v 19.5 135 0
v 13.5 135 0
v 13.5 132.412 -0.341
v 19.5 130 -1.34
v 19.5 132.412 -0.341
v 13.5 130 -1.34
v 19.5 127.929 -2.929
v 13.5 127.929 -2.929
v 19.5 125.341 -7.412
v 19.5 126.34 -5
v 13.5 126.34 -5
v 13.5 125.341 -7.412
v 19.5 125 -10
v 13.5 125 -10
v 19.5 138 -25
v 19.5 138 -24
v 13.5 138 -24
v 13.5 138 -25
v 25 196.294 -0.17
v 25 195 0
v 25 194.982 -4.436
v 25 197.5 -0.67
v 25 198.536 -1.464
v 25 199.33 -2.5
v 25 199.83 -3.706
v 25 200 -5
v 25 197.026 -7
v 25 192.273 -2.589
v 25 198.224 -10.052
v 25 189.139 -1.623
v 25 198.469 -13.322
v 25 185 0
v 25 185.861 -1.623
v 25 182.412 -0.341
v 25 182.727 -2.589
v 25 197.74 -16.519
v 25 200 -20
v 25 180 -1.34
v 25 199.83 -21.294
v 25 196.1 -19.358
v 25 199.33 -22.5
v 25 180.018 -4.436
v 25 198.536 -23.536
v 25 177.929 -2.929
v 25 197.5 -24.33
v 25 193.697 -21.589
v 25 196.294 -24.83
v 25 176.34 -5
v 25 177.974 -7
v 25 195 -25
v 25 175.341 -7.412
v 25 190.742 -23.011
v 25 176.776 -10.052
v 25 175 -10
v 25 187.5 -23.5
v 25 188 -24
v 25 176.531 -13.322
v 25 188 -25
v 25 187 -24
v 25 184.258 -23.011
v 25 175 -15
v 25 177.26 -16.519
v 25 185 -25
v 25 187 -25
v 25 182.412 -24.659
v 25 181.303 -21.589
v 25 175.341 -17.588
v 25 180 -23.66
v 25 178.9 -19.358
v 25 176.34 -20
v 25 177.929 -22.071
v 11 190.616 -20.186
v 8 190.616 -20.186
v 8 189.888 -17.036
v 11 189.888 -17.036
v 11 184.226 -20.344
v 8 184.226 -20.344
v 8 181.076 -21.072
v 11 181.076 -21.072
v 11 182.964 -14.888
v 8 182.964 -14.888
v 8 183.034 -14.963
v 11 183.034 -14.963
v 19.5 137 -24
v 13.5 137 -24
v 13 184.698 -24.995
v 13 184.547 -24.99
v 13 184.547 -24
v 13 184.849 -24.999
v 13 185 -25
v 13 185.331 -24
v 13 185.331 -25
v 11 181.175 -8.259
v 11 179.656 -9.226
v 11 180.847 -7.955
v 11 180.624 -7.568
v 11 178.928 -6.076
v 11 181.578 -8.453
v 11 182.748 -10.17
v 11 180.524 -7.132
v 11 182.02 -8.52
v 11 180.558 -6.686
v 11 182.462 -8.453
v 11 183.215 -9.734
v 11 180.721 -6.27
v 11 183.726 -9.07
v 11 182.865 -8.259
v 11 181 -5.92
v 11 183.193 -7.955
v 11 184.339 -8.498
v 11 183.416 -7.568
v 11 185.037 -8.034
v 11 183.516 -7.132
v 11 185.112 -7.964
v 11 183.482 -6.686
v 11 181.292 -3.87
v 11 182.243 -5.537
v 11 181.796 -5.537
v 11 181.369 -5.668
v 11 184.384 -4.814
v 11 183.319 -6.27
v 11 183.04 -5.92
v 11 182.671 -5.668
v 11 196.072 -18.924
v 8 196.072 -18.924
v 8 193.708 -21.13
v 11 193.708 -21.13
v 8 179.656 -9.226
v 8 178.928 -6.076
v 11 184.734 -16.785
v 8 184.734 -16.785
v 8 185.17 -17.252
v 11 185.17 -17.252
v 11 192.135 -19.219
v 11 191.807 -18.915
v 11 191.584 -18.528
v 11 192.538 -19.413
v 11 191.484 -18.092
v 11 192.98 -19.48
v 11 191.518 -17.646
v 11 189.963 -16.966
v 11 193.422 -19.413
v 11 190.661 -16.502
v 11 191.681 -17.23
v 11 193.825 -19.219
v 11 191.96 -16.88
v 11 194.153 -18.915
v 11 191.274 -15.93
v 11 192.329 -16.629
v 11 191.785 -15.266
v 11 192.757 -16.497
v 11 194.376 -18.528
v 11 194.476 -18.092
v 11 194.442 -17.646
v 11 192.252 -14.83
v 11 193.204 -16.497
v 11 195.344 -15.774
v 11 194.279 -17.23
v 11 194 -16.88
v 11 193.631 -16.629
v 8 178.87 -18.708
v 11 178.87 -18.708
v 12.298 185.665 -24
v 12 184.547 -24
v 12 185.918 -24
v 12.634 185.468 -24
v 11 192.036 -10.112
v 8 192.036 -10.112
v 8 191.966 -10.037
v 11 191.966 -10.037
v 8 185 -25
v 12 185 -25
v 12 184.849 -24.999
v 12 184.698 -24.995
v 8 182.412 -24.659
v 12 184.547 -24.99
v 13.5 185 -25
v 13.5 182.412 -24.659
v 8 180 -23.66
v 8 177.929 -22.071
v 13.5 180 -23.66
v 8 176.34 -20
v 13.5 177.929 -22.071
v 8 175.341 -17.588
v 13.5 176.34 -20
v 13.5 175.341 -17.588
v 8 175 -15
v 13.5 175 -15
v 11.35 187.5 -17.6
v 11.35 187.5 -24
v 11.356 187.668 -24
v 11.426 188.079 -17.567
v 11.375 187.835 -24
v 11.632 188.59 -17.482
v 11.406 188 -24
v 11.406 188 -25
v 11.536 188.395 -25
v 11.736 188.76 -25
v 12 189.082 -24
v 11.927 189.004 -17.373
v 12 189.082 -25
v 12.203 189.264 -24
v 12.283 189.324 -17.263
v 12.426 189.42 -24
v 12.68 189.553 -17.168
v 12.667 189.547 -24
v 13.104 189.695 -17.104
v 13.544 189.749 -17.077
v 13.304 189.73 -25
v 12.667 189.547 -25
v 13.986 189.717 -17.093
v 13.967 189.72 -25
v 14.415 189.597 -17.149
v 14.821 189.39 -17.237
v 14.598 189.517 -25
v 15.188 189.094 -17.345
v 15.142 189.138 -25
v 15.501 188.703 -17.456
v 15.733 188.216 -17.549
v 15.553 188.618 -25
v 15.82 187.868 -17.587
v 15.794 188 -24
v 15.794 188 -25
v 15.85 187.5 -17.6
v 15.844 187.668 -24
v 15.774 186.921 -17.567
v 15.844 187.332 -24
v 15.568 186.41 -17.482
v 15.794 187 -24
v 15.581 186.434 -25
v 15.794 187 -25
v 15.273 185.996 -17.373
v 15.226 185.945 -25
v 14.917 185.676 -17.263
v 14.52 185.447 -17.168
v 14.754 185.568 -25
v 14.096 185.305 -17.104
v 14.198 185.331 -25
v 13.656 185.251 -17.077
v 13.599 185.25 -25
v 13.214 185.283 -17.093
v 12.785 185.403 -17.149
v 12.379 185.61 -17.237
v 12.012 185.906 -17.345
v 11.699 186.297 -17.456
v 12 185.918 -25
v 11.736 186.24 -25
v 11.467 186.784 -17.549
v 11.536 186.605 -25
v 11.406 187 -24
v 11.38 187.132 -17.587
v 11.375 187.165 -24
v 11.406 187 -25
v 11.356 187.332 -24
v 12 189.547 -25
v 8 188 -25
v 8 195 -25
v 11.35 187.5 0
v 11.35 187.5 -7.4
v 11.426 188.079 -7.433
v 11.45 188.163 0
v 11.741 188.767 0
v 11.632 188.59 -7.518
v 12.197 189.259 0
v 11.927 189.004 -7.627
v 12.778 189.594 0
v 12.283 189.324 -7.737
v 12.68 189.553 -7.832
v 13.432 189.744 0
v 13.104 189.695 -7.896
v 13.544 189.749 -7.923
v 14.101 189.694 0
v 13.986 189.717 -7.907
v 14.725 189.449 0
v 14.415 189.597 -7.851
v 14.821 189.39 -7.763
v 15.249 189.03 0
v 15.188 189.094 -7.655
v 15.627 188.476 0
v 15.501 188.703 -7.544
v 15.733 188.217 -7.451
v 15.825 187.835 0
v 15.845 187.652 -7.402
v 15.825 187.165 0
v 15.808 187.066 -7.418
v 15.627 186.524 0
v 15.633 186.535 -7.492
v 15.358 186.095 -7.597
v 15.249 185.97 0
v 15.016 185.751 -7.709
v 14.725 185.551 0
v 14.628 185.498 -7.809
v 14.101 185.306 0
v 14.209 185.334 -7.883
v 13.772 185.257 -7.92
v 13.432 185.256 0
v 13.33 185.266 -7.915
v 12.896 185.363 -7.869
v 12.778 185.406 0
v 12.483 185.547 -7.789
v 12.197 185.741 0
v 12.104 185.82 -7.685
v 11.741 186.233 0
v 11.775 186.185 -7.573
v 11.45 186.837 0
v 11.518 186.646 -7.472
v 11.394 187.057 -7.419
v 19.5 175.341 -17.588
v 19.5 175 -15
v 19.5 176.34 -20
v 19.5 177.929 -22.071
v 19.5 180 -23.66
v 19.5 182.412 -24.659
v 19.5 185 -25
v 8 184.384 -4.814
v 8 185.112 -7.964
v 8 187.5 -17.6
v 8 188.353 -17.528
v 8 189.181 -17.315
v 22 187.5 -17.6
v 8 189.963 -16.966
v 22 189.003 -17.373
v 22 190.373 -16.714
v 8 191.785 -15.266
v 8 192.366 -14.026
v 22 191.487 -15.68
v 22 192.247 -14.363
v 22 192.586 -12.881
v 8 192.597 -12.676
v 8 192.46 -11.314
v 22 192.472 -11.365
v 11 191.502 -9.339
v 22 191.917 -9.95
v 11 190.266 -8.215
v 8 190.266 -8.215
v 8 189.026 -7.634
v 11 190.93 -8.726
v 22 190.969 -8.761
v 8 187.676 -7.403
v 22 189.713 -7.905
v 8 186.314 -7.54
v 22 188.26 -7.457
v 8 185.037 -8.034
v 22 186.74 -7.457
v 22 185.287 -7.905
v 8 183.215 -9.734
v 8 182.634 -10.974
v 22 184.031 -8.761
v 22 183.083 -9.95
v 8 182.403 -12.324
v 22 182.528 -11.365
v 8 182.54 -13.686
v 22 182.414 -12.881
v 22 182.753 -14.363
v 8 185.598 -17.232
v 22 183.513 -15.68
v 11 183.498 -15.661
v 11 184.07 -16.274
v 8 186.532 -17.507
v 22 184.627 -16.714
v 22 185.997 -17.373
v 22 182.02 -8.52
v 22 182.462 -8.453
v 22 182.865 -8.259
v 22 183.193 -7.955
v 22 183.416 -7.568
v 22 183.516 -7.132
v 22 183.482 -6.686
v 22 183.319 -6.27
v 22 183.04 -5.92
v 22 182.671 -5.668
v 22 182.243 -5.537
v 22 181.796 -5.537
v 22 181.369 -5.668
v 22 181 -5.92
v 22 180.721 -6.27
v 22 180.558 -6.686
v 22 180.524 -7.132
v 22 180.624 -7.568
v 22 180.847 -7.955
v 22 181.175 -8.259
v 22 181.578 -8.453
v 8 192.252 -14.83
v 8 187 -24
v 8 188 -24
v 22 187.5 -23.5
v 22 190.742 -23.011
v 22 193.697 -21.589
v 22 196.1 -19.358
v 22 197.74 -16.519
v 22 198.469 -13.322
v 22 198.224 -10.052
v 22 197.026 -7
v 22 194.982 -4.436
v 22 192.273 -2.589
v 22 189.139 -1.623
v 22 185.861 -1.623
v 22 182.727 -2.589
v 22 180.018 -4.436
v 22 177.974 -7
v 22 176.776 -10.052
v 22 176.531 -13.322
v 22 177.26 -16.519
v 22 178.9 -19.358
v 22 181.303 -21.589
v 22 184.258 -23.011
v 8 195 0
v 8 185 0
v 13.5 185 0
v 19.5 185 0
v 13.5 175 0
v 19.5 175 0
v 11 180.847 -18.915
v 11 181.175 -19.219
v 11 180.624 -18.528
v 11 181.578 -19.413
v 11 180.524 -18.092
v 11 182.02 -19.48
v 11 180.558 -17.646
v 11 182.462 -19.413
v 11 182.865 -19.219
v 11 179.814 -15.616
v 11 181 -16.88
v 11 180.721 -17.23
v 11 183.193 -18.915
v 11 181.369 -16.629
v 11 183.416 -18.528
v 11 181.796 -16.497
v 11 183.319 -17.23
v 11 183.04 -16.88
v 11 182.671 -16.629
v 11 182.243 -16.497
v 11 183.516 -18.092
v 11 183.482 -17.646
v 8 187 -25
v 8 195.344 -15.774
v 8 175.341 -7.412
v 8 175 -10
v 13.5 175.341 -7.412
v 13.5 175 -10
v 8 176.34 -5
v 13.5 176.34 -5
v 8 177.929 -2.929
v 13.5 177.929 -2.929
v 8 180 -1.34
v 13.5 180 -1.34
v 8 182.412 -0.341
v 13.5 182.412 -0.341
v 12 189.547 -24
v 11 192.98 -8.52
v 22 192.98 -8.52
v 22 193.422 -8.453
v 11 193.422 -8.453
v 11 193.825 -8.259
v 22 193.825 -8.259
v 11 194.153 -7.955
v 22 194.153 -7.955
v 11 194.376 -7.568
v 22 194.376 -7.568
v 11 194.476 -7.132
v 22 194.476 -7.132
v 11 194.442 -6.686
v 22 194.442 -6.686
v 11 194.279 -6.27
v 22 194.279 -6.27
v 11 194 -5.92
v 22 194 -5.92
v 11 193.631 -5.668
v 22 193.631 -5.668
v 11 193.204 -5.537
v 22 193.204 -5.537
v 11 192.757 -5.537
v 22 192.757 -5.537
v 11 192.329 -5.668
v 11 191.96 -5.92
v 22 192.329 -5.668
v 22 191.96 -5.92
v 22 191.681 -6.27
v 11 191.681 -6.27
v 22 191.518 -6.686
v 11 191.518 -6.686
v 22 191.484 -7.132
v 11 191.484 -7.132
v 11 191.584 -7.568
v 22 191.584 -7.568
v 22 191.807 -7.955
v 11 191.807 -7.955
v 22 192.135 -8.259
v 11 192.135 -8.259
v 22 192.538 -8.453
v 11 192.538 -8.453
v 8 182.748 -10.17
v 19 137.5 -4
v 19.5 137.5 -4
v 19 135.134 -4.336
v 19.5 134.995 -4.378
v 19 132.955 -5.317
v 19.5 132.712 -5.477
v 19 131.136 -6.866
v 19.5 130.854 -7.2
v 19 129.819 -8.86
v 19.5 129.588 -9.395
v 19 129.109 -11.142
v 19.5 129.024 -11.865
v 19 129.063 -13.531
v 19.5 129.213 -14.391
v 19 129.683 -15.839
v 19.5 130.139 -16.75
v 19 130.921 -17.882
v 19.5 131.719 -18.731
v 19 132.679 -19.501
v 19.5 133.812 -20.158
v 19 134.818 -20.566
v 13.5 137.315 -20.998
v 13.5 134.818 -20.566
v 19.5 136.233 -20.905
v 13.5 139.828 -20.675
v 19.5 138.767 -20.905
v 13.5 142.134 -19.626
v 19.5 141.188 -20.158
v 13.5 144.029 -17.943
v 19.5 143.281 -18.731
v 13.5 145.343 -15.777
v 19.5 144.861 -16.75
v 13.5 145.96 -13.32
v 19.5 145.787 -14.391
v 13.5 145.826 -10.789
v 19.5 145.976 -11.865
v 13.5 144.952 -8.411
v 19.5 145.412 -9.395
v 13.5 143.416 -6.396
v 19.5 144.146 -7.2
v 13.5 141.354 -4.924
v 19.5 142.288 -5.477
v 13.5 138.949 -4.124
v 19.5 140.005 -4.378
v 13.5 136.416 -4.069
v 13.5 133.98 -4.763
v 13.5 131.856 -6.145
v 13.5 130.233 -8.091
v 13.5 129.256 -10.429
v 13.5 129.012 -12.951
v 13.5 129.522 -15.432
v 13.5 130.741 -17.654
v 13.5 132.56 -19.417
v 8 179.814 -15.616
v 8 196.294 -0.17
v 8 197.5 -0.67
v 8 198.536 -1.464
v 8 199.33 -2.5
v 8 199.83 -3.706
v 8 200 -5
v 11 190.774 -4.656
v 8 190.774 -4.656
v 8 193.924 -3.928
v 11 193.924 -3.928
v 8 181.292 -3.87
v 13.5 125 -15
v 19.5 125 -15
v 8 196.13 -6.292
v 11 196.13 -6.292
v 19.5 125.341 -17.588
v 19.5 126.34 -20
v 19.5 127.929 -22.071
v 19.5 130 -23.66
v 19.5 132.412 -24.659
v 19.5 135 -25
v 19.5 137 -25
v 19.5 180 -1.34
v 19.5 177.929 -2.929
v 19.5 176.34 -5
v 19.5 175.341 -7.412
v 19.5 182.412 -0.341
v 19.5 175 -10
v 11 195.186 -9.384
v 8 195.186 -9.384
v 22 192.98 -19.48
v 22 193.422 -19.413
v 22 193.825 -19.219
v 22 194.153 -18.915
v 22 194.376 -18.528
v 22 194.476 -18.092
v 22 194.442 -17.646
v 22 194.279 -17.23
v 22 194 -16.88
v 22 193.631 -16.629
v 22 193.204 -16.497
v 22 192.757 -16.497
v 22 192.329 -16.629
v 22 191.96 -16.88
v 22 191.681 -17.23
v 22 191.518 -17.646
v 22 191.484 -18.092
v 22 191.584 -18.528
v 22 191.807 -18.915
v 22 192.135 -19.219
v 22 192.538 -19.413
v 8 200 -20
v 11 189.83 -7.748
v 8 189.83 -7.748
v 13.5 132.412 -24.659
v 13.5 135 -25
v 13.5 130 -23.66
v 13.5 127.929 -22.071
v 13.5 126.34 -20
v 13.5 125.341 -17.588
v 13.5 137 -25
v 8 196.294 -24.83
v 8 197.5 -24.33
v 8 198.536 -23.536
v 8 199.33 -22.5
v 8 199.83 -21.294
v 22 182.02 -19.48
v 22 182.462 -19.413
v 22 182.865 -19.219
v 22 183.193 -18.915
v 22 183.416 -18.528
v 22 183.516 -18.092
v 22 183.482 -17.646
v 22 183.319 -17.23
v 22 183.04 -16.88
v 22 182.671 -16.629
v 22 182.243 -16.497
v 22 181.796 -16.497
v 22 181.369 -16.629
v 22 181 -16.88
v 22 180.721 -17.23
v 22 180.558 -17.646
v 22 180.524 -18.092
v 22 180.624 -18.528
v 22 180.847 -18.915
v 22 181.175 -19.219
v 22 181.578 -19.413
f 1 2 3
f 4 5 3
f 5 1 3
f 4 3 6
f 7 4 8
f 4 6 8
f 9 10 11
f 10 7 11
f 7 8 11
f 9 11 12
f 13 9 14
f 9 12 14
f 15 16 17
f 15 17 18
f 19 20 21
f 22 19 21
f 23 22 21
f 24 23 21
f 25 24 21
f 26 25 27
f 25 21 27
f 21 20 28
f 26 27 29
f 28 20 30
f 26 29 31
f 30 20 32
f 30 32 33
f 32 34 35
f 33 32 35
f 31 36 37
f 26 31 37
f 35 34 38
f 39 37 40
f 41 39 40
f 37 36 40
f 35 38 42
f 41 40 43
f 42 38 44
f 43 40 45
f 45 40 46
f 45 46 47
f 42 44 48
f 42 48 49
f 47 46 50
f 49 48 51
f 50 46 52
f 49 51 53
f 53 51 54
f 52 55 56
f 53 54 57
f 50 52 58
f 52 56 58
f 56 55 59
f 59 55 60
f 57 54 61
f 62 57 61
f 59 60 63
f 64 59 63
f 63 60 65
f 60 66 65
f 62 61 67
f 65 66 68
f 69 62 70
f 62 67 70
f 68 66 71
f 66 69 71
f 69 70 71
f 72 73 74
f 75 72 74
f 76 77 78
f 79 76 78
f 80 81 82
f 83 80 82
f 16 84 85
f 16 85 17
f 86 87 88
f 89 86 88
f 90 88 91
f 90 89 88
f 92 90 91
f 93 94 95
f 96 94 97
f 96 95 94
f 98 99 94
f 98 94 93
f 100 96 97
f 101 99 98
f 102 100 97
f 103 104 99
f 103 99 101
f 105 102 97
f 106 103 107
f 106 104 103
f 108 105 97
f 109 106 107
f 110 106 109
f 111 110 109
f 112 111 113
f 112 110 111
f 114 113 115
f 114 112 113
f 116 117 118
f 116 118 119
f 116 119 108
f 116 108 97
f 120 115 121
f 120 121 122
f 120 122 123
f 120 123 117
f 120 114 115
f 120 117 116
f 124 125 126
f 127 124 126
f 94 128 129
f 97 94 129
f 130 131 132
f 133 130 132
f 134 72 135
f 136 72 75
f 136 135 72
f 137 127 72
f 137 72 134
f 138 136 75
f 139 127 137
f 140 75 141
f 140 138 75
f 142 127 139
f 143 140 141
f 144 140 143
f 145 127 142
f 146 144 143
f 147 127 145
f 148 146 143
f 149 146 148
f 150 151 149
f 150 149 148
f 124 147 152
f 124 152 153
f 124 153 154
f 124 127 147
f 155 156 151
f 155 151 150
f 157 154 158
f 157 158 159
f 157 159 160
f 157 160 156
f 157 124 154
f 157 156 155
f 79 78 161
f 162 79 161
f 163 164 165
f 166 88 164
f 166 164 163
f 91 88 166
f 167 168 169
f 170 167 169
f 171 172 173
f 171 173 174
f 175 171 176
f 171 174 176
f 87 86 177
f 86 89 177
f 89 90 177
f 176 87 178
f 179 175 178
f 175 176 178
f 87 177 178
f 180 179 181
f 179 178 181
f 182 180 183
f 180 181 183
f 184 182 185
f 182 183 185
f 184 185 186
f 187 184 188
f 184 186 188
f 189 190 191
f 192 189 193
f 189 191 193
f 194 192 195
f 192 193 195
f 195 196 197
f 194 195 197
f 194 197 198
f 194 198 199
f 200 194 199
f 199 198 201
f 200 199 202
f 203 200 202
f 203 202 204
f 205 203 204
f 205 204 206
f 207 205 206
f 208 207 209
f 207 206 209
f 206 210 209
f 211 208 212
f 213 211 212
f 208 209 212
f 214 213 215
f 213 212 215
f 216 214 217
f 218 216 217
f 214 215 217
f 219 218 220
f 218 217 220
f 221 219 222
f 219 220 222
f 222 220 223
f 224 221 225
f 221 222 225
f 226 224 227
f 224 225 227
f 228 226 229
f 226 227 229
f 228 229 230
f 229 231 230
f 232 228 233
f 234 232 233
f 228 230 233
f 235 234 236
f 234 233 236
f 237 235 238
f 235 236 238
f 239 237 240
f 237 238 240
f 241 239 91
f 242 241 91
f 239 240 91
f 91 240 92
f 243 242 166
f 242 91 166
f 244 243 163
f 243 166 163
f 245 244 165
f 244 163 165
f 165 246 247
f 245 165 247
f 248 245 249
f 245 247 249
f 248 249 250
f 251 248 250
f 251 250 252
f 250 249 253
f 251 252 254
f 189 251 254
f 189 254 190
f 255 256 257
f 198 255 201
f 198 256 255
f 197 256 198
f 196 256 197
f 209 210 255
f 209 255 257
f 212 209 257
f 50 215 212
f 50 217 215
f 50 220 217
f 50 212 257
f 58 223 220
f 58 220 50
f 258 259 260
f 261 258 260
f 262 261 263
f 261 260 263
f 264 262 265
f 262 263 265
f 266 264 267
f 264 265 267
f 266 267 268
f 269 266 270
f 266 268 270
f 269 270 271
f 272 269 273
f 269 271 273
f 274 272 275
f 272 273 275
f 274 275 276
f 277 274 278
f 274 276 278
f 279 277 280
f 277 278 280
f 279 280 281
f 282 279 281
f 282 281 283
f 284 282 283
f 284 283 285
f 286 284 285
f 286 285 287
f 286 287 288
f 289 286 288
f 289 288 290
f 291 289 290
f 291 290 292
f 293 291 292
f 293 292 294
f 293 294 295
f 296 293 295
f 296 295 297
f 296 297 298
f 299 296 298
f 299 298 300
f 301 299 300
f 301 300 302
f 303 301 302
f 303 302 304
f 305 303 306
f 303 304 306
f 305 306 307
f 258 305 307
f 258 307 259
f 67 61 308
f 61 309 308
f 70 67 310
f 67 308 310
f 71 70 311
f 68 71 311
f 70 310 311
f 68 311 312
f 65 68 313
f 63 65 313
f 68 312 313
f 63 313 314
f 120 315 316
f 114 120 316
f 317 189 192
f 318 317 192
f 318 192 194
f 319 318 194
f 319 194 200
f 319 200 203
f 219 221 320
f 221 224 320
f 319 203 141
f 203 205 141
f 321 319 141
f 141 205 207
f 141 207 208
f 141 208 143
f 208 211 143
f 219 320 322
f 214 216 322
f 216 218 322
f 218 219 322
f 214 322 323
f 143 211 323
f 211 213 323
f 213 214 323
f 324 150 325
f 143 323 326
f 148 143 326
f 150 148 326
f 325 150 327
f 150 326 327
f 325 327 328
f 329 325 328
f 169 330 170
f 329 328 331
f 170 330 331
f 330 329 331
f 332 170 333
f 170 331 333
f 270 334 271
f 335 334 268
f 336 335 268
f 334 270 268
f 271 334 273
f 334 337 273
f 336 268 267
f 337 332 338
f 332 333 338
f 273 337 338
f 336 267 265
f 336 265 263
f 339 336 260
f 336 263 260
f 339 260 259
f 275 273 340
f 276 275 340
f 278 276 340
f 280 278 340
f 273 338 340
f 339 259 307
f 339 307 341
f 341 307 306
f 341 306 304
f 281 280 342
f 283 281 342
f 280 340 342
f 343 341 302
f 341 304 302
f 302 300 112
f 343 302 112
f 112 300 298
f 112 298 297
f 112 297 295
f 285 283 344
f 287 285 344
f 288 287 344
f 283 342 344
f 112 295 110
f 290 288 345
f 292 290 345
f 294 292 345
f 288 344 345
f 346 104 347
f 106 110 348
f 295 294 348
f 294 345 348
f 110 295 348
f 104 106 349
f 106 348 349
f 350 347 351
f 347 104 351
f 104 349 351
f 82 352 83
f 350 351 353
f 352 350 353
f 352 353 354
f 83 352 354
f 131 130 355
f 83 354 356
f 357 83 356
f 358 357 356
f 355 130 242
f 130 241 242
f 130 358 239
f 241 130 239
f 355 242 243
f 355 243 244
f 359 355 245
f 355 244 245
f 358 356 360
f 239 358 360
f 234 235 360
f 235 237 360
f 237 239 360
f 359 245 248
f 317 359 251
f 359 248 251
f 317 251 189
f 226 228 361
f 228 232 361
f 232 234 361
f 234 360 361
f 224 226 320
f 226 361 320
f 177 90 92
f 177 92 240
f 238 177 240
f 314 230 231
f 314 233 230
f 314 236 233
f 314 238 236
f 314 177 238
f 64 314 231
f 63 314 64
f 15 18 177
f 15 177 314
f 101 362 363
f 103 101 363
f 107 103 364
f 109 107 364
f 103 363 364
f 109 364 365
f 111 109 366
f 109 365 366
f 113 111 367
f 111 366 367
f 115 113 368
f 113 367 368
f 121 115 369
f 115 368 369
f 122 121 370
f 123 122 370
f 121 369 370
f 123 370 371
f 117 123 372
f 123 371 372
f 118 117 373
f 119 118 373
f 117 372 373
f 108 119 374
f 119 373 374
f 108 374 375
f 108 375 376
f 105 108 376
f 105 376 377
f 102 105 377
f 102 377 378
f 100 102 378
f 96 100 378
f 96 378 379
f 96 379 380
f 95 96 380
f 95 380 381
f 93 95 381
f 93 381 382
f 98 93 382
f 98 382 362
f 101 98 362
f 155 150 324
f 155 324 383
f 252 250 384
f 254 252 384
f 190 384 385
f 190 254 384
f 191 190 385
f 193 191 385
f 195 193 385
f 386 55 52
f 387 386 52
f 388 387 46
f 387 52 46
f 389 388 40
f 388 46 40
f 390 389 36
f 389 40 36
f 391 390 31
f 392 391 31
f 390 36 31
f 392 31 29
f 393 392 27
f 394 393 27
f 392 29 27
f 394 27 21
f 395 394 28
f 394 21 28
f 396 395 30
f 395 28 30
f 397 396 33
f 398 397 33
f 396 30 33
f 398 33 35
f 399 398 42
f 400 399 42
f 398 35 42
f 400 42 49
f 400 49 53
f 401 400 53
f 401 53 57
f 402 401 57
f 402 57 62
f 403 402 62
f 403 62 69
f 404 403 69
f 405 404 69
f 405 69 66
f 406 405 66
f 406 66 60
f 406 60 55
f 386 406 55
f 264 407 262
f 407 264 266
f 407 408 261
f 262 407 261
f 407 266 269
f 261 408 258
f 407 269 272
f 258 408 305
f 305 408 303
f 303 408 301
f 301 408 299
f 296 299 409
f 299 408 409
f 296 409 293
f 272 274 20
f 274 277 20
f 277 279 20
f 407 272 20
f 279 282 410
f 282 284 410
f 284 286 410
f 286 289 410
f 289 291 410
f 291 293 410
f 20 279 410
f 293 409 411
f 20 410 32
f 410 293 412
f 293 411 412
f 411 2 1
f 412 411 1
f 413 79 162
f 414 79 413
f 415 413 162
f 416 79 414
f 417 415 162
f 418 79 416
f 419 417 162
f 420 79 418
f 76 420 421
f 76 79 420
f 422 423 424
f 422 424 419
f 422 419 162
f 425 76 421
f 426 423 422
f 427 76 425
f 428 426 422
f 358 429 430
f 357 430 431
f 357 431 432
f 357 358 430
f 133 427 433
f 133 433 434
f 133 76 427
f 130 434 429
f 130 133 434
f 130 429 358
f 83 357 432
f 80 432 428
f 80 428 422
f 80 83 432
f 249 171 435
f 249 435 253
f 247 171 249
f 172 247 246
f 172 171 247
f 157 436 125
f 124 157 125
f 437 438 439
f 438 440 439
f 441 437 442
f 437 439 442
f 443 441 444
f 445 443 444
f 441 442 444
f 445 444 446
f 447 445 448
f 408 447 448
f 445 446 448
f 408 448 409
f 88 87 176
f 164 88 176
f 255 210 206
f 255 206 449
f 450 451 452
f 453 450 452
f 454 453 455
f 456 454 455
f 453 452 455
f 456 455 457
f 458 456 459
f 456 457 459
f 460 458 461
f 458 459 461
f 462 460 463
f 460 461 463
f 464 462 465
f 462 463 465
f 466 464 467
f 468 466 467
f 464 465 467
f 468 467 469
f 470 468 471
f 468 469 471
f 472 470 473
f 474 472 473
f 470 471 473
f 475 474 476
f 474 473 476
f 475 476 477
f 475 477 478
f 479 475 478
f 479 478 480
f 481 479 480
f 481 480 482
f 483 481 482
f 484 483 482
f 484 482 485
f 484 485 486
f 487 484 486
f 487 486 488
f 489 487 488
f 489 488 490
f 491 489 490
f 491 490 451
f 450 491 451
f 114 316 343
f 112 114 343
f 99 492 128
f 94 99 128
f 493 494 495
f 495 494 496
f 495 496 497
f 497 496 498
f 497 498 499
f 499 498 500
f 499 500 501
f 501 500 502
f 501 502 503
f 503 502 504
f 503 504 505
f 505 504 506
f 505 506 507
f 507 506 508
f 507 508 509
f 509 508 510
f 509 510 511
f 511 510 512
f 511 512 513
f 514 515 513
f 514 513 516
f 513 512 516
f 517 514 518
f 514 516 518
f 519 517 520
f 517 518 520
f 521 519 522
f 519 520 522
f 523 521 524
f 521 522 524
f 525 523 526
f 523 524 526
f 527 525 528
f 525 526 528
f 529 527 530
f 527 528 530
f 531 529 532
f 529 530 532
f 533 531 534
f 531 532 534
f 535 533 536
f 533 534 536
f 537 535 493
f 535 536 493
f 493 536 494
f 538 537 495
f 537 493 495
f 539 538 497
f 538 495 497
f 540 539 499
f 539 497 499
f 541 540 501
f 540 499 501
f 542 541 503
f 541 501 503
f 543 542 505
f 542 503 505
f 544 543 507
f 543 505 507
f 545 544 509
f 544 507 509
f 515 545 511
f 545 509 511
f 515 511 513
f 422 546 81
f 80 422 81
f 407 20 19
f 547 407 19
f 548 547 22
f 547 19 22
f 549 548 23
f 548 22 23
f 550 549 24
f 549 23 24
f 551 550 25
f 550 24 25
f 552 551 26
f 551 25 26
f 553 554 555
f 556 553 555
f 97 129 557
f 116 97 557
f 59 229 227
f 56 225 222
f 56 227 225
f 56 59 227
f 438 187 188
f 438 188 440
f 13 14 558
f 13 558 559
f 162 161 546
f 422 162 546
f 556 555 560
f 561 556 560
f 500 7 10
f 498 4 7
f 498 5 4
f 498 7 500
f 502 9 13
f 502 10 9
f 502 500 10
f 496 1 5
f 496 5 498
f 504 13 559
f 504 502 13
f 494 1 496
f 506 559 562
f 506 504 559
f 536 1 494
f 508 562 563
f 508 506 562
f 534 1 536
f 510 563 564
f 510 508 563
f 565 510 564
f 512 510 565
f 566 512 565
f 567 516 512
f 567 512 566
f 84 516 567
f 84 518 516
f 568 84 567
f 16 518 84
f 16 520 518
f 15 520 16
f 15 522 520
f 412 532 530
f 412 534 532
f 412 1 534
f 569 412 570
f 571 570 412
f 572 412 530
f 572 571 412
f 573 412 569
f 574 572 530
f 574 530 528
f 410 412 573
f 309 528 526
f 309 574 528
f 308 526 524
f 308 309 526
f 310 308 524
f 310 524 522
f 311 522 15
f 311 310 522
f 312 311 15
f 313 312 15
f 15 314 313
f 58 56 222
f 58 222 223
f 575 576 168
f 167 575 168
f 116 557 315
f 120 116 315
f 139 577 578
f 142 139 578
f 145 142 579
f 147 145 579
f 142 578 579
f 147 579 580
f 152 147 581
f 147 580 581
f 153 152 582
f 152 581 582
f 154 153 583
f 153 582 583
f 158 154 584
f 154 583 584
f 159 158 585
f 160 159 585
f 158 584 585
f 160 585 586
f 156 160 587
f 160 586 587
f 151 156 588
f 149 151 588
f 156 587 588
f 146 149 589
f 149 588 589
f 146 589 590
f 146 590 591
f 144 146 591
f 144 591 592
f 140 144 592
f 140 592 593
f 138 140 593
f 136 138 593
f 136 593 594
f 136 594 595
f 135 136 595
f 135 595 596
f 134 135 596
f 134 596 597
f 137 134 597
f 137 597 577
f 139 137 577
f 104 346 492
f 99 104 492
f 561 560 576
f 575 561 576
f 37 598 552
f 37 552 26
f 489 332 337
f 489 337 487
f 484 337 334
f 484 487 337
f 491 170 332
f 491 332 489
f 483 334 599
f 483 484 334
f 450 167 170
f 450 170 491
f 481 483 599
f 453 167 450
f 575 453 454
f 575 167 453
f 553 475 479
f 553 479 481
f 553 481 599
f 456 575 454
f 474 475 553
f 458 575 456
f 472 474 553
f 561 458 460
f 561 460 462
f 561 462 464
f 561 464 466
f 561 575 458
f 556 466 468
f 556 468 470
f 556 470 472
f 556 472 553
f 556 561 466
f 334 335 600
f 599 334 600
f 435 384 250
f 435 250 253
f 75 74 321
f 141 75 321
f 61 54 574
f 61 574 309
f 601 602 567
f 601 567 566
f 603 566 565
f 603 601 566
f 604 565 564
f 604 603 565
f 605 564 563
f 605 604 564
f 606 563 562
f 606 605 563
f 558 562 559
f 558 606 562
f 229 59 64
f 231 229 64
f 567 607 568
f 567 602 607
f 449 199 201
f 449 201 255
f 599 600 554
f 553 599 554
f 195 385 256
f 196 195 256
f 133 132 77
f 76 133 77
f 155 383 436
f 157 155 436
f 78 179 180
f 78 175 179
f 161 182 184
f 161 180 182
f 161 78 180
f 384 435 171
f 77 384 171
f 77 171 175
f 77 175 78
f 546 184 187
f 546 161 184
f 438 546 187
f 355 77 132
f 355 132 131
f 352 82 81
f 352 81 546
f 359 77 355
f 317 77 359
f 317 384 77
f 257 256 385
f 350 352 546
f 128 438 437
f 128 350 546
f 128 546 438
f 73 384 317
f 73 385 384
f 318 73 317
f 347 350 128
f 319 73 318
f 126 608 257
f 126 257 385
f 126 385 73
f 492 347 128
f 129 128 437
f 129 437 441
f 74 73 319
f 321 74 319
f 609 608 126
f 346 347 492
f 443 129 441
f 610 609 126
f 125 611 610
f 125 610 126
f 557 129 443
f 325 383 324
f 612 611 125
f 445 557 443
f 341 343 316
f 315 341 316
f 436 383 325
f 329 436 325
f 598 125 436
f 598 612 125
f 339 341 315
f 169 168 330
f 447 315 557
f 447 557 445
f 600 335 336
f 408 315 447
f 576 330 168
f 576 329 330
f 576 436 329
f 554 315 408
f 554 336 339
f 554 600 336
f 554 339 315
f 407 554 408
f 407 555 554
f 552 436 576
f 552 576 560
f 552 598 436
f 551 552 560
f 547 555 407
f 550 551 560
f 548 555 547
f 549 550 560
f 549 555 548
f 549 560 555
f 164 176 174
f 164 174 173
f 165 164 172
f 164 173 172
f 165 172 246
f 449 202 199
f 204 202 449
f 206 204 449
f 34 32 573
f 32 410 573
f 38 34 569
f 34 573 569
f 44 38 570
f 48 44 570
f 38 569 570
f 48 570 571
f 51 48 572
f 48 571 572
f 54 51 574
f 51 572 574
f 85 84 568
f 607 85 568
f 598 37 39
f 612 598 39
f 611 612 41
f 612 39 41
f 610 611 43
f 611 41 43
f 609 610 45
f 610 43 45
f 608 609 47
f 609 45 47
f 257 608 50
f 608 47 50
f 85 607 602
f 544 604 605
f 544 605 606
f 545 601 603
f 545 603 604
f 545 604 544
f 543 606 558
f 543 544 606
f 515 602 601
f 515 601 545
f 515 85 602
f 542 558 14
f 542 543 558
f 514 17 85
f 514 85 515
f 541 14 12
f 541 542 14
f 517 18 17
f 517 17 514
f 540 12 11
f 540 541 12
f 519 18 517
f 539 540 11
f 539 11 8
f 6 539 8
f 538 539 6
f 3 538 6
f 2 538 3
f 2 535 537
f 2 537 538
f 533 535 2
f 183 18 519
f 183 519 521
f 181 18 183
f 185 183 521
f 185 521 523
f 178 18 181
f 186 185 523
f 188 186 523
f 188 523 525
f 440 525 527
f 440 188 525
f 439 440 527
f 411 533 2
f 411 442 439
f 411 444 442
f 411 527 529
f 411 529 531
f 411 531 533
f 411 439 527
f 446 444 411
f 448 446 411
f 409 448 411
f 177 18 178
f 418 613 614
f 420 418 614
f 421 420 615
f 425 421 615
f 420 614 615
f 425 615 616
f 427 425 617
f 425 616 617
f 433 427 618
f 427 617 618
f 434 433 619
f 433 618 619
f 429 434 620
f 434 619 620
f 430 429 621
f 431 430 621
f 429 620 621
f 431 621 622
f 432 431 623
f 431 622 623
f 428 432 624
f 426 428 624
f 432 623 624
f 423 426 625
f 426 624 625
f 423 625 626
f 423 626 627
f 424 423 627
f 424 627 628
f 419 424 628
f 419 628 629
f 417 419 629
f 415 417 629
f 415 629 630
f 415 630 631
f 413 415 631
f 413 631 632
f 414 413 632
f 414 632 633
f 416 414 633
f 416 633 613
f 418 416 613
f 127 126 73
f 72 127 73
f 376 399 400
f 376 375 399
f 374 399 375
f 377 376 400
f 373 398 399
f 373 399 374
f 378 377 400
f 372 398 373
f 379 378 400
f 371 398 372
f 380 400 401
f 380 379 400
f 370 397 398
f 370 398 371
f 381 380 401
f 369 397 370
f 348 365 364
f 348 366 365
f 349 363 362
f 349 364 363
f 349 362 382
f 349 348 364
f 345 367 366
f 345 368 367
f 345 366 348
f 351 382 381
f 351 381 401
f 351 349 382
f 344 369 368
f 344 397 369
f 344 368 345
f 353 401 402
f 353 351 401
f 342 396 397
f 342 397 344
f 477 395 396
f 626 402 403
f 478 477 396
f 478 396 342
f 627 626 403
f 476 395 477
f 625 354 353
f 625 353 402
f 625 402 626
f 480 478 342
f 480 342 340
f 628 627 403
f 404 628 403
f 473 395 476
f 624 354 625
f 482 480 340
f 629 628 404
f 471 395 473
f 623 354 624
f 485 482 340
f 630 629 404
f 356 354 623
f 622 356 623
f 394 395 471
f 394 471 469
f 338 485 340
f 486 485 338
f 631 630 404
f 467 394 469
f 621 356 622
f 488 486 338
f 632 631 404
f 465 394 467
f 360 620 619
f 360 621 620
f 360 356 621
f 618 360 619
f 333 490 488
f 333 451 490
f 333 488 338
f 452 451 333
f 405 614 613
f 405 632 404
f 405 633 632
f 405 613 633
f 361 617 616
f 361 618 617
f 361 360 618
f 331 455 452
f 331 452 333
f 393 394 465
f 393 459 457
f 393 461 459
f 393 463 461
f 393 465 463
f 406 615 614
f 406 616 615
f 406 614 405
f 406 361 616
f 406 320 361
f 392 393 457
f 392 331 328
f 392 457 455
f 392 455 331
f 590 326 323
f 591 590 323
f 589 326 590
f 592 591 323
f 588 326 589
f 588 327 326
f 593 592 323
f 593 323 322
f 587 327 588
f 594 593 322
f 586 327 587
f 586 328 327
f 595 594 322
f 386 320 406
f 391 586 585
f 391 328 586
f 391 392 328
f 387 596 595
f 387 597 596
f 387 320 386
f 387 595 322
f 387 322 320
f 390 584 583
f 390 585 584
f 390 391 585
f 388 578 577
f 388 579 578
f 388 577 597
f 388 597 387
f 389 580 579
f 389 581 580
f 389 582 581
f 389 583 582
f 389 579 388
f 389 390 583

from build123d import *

# Parameters (mm, degrees)
CROQUIS1_W              = 25
CROQUIS1_H              = 25
SALIENTE_EXTRUIR1_DEPTH = 200
REDONDEO1_R             = 10
REDONDEO2_R             = 10
REDONDEO3_R             = 5
REDONDEO4_R             = 5
CROQUIS2_R              = 11
CROQUIS2_R_2            = 8.5
CORTAR_EXTRUIR1_DEPTH   = 6
CROQUIS3_R              = 8.5
CORTAR_EXTRUIR2_DEPTH   = 6
CROQUIS9_R              = 5.1
CROQUIS9_R_2            = 6
CORTAR_EXTRUIR6_DEPTH   = 30
CROQUIS13_W             = 1
CROQUIS13_H             = 5
CORTAR_EXTRUIR8_DEPTH   = 1
SALIENTE_EXTRUIR3_START = 3
CROQUIS14_R             = 11
CROQUIS14_R_2           = 5.1
SALIENTE_EXTRUIR3_DEPTH = 3
CROQUIS15_R             = 1.5
CORTAR_EXTRUIR9_DEPTH   = 16
CORTAR_EXTRUIR10_DEPTH  = 11
CORTAR_EXTRUIR12_REACH  = 205.101
CROQUIS18_W             = 1
CROQUIS18_H             = 1
CROQUIS20_W             = 17
CROQUIS20_H             = 100
CORTAR_EXTRUIR14_DEPTH  = 10
CROQUIS12_R             = 2.25
CORTAR_EXTRUIR7_DEPTH   = 204.100960116
CROQUIS21_W             = 58.914779702
CROQUIS21_H             = 35.760408196
CORTAR_EXTRUIR15_DEPTH  = 125
CROQUIS22_W             = 33.286593493
CROQUIS22_H             = 72.977677401
CORTAR_EXTRUIR16_DEPTH  = 8
REDONDEO5_R             = 10
CROQUIS24_R             = 8.5
CORTAR_EXTRUIR18_DEPTH  = 27
CROQUIS25_W             = 26.132042823
CROQUIS25_H             = 80
CORTAR_EXTRUIR19_DEPTH  = 5.5
REDONDEO6_R             = 10
REDONDEO7_R             = 10
CROQUIS27_W             = 27.934503923
CROQUIS27_H             = 80
CORTAR_EXTRUIR21_DEPTH  = 13.5
REDONDEO8_R             = 10
REDONDEO9_R             = 10


with BuildPart() as part:
    # Croquis1 → Saliente-Extruir1 (new body)
    with BuildSketch(Plane(origin=(0, 0, 0), x_dir=(1, 0, 0), z_dir=(0, 1, 0))):
        with Locations((12.5, 12.5)):
            Rectangle(CROQUIS1_W, CROQUIS1_H)
    extrude(amount=SALIENTE_EXTRUIR1_DEPTH)

    # Redondeo1
    redondeo1_edges = [part.edges().sort_by_distance(p)[0] for p in [
        (12.5, 0, -25),
    ]]
    fillet(redondeo1_edges, radius=REDONDEO1_R)

    # Redondeo2
    redondeo2_edges = [part.edges().sort_by_distance(p)[0] for p in [
        (12.5, 0, 0),
    ]]
    fillet(redondeo2_edges, radius=REDONDEO2_R)

    # Redondeo3
    redondeo3_edges = [part.edges().sort_by_distance(p)[0] for p in [
        (12.5, 200, 0),
    ]]
    fillet(redondeo3_edges, radius=REDONDEO3_R)

    # Redondeo4
    redondeo4_edges = [part.edges().sort_by_distance(p)[0] for p in [
        (12.5, 200, -25),
    ]]
    fillet(redondeo4_edges, radius=REDONDEO4_R)

    # Croquis2 → Cortar-Extruir1 (cut)
    with BuildSketch(Plane(origin=(25, 0, 0), x_dir=(0, 0, -1), z_dir=(1, 0, 0))):
        with Locations((12.5, 187.5)):
            Circle(CROQUIS2_R)
        with Locations(Location((12.5, 137.5, 0), (0, 0, 180))):
            Circle(CROQUIS2_R_2)
    extrude(amount=-CORTAR_EXTRUIR1_DEPTH, mode=Mode.SUBTRACT)

    # Croquis3 → Cortar-Extruir2 (cut)
    with BuildSketch(Plane.ZY):
        with Locations((-12.5, 12.5)):
            Circle(CROQUIS3_R)
        with Locations(Location((-12.5, 187.5, 0), (0, 0, 180))):
            Circle(CROQUIS3_R)
    extrude(amount=-CORTAR_EXTRUIR2_DEPTH, mode=Mode.SUBTRACT)

    # Croquis9 → Cortar-Extruir6 (cut)
    with BuildSketch(Plane(origin=(19, 0, 0), x_dir=(0, 0, -1), z_dir=(1, 0, 0))):
        with Locations((12.5, 187.5)):
            Circle(CROQUIS9_R)
        with Locations((12.5, 137.5)):
            Circle(CROQUIS9_R_2)
    extrude(amount=-CORTAR_EXTRUIR6_DEPTH, mode=Mode.SUBTRACT)

    # Croquis13 → Cortar-Extruir8 (cut)
    with BuildSketch(Plane(origin=(0, 0, -25), x_dir=(-1, 0, 0), z_dir=(0, 0, -1))):
        with Locations((-12.5, 187.04733642)):
            Rectangle(CROQUIS13_W, CROQUIS13_H)
    extrude(amount=-CORTAR_EXTRUIR8_DEPTH, mode=Mode.SUBTRACT)

    # Croquis14 → Saliente-Extruir3 (add)
    with BuildSketch(Plane(origin=(19, 0, 0), x_dir=(0, 0, -1), z_dir=(1, 0, 0)).offset(SALIENTE_EXTRUIR3_START)):
        with Locations((12.5, 187.5)):
            Circle(CROQUIS14_R)
        with Locations((12.5, 187.5)):
            Circle(CROQUIS14_R_2, mode=Mode.SUBTRACT)
    extrude(amount=-SALIENTE_EXTRUIR3_DEPTH)

    # Croquis15 → Cortar-Extruir9 (cut)
    with BuildSketch(Plane(origin=(22, 0, 0), x_dir=(0, 0, -1), z_dir=(1, 0, 0))):
        with Locations((17.980077554, 182.019922446)):
            Circle(CROQUIS15_R)
        with Locations((7.019922446, 182.019922446)):
            Circle(CROQUIS15_R)
        with Locations((7.019922446, 192.980077554)):
            Circle(CROQUIS15_R)
        with Locations((17.980077554, 192.980077554)):
            Circle(CROQUIS15_R)
    extrude(amount=-CORTAR_EXTRUIR9_DEPTH, mode=Mode.SUBTRACT)

    # Croquis16 → Cortar-Extruir10 (cut)
    with BuildSketch(Plane.ZY):
        Polygon((-14.829996635, 192.251844396), (-15.774368679, 195.344011075), (-18.924449599, 196.072244234), (-21.130158474, 193.708310713), (-20.185786429, 190.616144033), (-17.035705509, 189.887910875), align=None)
        Polygon((-17.251844396, 185.170003365), (-20.344011075, 184.225631321), (-21.072244234, 181.075550401), (-18.708310713, 178.869841526), (-15.616144033, 179.814213571), (-14.887910875, 182.964294491), align=None)
        Polygon((-7.748155604, 189.829996635), (-4.655988925, 190.774368679), (-3.927755766, 193.924449599), (-6.291689287, 196.130158474), (-9.383855967, 195.185786429), (-10.112089125, 192.035705509), align=None)
        Polygon((-10.170003365, 182.748155604), (-9.225631321, 179.655988925), (-6.075550401, 178.927755766), (-3.869841526, 181.291689287), (-4.814213571, 184.383855967), (-7.964294491, 185.112089125), align=None)
    extrude(amount=-CORTAR_EXTRUIR10_DEPTH, mode=Mode.SUBTRACT)

    # Cortar-Extruir12: up to this face of the body (flat: up to its plane)
    cortar_extruir12_end = Plane(part.part.faces().sort_by_distance((0, 98.930151157, -12.5))[0])
    # Croquis18 → Cortar-Extruir12 (cut, up to the picked face)
    with BuildSketch(Plane(origin=(25, 0, 0), x_dir=(0, 0, -1), z_dir=(1, 0, 0)), mode=Mode.PRIVATE) as cortar_extruir12_sk1:
        with Locations((24.5, 187.5)):
            Rectangle(CROQUIS18_W, CROQUIS18_H)
    cortar_extruir12_tool1 = split(extrude(cortar_extruir12_sk1.sketch, amount=-CORTAR_EXTRUIR12_REACH, mode=Mode.PRIVATE), bisect_by=cortar_extruir12_end, keep=Keep.BOTH, mode=Mode.PRIVATE)
    # Croquis18 → Cortar-Extruir12 (cut, up to the picked face)
    with BuildSketch(Plane(origin=(25, 0, 0), x_dir=(0, 0, -1), z_dir=(1, 0, 0)), mode=Mode.PRIVATE) as cortar_extruir12_sk2:
        with Locations((24.5, 137.5)):
            Rectangle(CROQUIS18_W, CROQUIS18_H)
    cortar_extruir12_tool2 = split(extrude(cortar_extruir12_sk2.sketch, amount=-CORTAR_EXTRUIR12_REACH, mode=Mode.PRIVATE), bisect_by=cortar_extruir12_end, keep=Keep.BOTH, mode=Mode.PRIVATE)
    add(cortar_extruir12_tool1.solids().sort_by(Axis((25, 187.5, -24.5), (-1, 0, 0)))[0], mode=Mode.SUBTRACT)
    add(cortar_extruir12_tool2.solids().sort_by(Axis((25, 137.5, -24.5), (-1, 0, 0)))[0], mode=Mode.SUBTRACT)

    # Croquis20 → Cortar-Extruir14 (cut)
    with BuildSketch(Plane.ZY):
        with Locations((-12.5, 75)):
            Rectangle(CROQUIS20_W, CROQUIS20_H)
    extrude(amount=-CORTAR_EXTRUIR14_DEPTH, mode=Mode.SUBTRACT)

    # Croquis12 → Cortar-Extruir7 (cut, through all)
    with BuildSketch(Plane(origin=(0, 0, -25), x_dir=(-1, 0, 0), z_dir=(0, 0, -1))):
        with Locations((-13.6, 187.5)):
            Circle(CROQUIS12_R)
    extrude(amount=-CORTAR_EXTRUIR7_DEPTH, mode=Mode.SUBTRACT)

    # Croquis21 → Cortar-Extruir15 (cut)
    with BuildSketch(Plane.XZ):
        with Locations((8.512503063, -10.548361389)):
            Rectangle(CROQUIS21_W, CROQUIS21_H)
    extrude(amount=-CORTAR_EXTRUIR15_DEPTH, mode=Mode.SUBTRACT)

    # Croquis22 → Cortar-Extruir16 (cut)
    with BuildSketch(Plane.ZY):
        with Locations((-13.640786543, 171.307251967)):
            Rectangle(CROQUIS22_W, CROQUIS22_H)
    extrude(amount=-CORTAR_EXTRUIR16_DEPTH, mode=Mode.SUBTRACT)

    # Redondeo5
    redondeo5_edges = [part.edges().sort_by_distance(p)[0] for p in [
        (12.5, 125, -25),
        (12.5, 125, 0),
    ]]
    fillet(redondeo5_edges, radius=REDONDEO5_R)

    # Croquis24 → Cortar-Extruir18 (cut)
    with BuildSketch(Plane(origin=(19, 0, 0), x_dir=(0, 0, -1), z_dir=(1, 0, 0))):
        with Locations(Location((12.5, 137.5, 0), (0, 0, 341.610158782))):
            Circle(CROQUIS24_R)
    extrude(amount=-CORTAR_EXTRUIR18_DEPTH, mode=Mode.SUBTRACT)

    # Croquis25 → Cortar-Extruir19 (cut)
    with BuildSketch(Plane(origin=(25, 0, 0), x_dir=(0, 0, -1), z_dir=(1, 0, 0))):
        with Locations((13.066021412, 135)):
            Rectangle(CROQUIS25_W, CROQUIS25_H)
    extrude(amount=-CORTAR_EXTRUIR19_DEPTH, mode=Mode.SUBTRACT)

    # Redondeo6
    redondeo6_edges = [part.edges().sort_by_distance(p)[0] for p in [
        (22.25, 175, -25),
    ]]
    fillet(redondeo6_edges, radius=REDONDEO6_R)

    # Redondeo7
    redondeo7_edges = [part.edges().sort_by_distance(p)[0] for p in [
        (22.25, 175, 0),
    ]]
    fillet(redondeo7_edges, radius=REDONDEO7_R)

    # Croquis27 → Cortar-Extruir21 (cut)
    with BuildSketch(Plane.ZY):
        with Locations((-13.967251962, 135)):
            Rectangle(CROQUIS27_W, CROQUIS27_H)
    extrude(amount=-CORTAR_EXTRUIR21_DEPTH, mode=Mode.SUBTRACT)

    # Redondeo8
    # the kernel refuses this fillet: 10 mm, written as the material it takes off along each edge
    with BuildSketch(Plane(origin=(38.5, 175, -25), x_dir=(0, 0, 1), z_dir=(-1, 0, 0))) as redondeo8_piece_1_section:
        with BuildLine():
            CenterArc((REDONDEO8_R, REDONDEO8_R), REDONDEO8_R, 180, 90)
            Line((0, REDONDEO8_R), (0, 0))
            Line((0, 0), (REDONDEO8_R, 0))
        make_face()
    redondeo8_piece_1 = extrude(amount=55.5, mode=Mode.PRIVATE)
    redondeo8_piece_1 = split(redondeo8_piece_1, bisect_by=Plane(origin=(19.5, 177.263951143, -22.736048857), z_dir=(1, 0, 0)), keep=Keep.TOP, mode=Mode.PRIVATE)
    add(redondeo8_piece_1, mode=Mode.SUBTRACT)
    with BuildSketch(Plane(origin=(13.5, 175, -25), x_dir=(0, 0, 1), z_dir=(-1, 0, 0))) as redondeo8_piece_2:
        with BuildLine():
            CenterArc((REDONDEO8_R, REDONDEO8_R), REDONDEO8_R, 180, 90)
            Line((0, REDONDEO8_R), (0, 0))
            Line((0, 0), (REDONDEO8_R, 0))
        make_face()
    extrude(amount=30.5, mode=Mode.SUBTRACT)

    # Redondeo9
    redondeo9_edges = [part.edges().sort_by_distance(p)[0] for p in [
        (10.75, 175, 0),
    ]]
    fillet(redondeo9_edges, radius=REDONDEO9_R)


solid = part.part
